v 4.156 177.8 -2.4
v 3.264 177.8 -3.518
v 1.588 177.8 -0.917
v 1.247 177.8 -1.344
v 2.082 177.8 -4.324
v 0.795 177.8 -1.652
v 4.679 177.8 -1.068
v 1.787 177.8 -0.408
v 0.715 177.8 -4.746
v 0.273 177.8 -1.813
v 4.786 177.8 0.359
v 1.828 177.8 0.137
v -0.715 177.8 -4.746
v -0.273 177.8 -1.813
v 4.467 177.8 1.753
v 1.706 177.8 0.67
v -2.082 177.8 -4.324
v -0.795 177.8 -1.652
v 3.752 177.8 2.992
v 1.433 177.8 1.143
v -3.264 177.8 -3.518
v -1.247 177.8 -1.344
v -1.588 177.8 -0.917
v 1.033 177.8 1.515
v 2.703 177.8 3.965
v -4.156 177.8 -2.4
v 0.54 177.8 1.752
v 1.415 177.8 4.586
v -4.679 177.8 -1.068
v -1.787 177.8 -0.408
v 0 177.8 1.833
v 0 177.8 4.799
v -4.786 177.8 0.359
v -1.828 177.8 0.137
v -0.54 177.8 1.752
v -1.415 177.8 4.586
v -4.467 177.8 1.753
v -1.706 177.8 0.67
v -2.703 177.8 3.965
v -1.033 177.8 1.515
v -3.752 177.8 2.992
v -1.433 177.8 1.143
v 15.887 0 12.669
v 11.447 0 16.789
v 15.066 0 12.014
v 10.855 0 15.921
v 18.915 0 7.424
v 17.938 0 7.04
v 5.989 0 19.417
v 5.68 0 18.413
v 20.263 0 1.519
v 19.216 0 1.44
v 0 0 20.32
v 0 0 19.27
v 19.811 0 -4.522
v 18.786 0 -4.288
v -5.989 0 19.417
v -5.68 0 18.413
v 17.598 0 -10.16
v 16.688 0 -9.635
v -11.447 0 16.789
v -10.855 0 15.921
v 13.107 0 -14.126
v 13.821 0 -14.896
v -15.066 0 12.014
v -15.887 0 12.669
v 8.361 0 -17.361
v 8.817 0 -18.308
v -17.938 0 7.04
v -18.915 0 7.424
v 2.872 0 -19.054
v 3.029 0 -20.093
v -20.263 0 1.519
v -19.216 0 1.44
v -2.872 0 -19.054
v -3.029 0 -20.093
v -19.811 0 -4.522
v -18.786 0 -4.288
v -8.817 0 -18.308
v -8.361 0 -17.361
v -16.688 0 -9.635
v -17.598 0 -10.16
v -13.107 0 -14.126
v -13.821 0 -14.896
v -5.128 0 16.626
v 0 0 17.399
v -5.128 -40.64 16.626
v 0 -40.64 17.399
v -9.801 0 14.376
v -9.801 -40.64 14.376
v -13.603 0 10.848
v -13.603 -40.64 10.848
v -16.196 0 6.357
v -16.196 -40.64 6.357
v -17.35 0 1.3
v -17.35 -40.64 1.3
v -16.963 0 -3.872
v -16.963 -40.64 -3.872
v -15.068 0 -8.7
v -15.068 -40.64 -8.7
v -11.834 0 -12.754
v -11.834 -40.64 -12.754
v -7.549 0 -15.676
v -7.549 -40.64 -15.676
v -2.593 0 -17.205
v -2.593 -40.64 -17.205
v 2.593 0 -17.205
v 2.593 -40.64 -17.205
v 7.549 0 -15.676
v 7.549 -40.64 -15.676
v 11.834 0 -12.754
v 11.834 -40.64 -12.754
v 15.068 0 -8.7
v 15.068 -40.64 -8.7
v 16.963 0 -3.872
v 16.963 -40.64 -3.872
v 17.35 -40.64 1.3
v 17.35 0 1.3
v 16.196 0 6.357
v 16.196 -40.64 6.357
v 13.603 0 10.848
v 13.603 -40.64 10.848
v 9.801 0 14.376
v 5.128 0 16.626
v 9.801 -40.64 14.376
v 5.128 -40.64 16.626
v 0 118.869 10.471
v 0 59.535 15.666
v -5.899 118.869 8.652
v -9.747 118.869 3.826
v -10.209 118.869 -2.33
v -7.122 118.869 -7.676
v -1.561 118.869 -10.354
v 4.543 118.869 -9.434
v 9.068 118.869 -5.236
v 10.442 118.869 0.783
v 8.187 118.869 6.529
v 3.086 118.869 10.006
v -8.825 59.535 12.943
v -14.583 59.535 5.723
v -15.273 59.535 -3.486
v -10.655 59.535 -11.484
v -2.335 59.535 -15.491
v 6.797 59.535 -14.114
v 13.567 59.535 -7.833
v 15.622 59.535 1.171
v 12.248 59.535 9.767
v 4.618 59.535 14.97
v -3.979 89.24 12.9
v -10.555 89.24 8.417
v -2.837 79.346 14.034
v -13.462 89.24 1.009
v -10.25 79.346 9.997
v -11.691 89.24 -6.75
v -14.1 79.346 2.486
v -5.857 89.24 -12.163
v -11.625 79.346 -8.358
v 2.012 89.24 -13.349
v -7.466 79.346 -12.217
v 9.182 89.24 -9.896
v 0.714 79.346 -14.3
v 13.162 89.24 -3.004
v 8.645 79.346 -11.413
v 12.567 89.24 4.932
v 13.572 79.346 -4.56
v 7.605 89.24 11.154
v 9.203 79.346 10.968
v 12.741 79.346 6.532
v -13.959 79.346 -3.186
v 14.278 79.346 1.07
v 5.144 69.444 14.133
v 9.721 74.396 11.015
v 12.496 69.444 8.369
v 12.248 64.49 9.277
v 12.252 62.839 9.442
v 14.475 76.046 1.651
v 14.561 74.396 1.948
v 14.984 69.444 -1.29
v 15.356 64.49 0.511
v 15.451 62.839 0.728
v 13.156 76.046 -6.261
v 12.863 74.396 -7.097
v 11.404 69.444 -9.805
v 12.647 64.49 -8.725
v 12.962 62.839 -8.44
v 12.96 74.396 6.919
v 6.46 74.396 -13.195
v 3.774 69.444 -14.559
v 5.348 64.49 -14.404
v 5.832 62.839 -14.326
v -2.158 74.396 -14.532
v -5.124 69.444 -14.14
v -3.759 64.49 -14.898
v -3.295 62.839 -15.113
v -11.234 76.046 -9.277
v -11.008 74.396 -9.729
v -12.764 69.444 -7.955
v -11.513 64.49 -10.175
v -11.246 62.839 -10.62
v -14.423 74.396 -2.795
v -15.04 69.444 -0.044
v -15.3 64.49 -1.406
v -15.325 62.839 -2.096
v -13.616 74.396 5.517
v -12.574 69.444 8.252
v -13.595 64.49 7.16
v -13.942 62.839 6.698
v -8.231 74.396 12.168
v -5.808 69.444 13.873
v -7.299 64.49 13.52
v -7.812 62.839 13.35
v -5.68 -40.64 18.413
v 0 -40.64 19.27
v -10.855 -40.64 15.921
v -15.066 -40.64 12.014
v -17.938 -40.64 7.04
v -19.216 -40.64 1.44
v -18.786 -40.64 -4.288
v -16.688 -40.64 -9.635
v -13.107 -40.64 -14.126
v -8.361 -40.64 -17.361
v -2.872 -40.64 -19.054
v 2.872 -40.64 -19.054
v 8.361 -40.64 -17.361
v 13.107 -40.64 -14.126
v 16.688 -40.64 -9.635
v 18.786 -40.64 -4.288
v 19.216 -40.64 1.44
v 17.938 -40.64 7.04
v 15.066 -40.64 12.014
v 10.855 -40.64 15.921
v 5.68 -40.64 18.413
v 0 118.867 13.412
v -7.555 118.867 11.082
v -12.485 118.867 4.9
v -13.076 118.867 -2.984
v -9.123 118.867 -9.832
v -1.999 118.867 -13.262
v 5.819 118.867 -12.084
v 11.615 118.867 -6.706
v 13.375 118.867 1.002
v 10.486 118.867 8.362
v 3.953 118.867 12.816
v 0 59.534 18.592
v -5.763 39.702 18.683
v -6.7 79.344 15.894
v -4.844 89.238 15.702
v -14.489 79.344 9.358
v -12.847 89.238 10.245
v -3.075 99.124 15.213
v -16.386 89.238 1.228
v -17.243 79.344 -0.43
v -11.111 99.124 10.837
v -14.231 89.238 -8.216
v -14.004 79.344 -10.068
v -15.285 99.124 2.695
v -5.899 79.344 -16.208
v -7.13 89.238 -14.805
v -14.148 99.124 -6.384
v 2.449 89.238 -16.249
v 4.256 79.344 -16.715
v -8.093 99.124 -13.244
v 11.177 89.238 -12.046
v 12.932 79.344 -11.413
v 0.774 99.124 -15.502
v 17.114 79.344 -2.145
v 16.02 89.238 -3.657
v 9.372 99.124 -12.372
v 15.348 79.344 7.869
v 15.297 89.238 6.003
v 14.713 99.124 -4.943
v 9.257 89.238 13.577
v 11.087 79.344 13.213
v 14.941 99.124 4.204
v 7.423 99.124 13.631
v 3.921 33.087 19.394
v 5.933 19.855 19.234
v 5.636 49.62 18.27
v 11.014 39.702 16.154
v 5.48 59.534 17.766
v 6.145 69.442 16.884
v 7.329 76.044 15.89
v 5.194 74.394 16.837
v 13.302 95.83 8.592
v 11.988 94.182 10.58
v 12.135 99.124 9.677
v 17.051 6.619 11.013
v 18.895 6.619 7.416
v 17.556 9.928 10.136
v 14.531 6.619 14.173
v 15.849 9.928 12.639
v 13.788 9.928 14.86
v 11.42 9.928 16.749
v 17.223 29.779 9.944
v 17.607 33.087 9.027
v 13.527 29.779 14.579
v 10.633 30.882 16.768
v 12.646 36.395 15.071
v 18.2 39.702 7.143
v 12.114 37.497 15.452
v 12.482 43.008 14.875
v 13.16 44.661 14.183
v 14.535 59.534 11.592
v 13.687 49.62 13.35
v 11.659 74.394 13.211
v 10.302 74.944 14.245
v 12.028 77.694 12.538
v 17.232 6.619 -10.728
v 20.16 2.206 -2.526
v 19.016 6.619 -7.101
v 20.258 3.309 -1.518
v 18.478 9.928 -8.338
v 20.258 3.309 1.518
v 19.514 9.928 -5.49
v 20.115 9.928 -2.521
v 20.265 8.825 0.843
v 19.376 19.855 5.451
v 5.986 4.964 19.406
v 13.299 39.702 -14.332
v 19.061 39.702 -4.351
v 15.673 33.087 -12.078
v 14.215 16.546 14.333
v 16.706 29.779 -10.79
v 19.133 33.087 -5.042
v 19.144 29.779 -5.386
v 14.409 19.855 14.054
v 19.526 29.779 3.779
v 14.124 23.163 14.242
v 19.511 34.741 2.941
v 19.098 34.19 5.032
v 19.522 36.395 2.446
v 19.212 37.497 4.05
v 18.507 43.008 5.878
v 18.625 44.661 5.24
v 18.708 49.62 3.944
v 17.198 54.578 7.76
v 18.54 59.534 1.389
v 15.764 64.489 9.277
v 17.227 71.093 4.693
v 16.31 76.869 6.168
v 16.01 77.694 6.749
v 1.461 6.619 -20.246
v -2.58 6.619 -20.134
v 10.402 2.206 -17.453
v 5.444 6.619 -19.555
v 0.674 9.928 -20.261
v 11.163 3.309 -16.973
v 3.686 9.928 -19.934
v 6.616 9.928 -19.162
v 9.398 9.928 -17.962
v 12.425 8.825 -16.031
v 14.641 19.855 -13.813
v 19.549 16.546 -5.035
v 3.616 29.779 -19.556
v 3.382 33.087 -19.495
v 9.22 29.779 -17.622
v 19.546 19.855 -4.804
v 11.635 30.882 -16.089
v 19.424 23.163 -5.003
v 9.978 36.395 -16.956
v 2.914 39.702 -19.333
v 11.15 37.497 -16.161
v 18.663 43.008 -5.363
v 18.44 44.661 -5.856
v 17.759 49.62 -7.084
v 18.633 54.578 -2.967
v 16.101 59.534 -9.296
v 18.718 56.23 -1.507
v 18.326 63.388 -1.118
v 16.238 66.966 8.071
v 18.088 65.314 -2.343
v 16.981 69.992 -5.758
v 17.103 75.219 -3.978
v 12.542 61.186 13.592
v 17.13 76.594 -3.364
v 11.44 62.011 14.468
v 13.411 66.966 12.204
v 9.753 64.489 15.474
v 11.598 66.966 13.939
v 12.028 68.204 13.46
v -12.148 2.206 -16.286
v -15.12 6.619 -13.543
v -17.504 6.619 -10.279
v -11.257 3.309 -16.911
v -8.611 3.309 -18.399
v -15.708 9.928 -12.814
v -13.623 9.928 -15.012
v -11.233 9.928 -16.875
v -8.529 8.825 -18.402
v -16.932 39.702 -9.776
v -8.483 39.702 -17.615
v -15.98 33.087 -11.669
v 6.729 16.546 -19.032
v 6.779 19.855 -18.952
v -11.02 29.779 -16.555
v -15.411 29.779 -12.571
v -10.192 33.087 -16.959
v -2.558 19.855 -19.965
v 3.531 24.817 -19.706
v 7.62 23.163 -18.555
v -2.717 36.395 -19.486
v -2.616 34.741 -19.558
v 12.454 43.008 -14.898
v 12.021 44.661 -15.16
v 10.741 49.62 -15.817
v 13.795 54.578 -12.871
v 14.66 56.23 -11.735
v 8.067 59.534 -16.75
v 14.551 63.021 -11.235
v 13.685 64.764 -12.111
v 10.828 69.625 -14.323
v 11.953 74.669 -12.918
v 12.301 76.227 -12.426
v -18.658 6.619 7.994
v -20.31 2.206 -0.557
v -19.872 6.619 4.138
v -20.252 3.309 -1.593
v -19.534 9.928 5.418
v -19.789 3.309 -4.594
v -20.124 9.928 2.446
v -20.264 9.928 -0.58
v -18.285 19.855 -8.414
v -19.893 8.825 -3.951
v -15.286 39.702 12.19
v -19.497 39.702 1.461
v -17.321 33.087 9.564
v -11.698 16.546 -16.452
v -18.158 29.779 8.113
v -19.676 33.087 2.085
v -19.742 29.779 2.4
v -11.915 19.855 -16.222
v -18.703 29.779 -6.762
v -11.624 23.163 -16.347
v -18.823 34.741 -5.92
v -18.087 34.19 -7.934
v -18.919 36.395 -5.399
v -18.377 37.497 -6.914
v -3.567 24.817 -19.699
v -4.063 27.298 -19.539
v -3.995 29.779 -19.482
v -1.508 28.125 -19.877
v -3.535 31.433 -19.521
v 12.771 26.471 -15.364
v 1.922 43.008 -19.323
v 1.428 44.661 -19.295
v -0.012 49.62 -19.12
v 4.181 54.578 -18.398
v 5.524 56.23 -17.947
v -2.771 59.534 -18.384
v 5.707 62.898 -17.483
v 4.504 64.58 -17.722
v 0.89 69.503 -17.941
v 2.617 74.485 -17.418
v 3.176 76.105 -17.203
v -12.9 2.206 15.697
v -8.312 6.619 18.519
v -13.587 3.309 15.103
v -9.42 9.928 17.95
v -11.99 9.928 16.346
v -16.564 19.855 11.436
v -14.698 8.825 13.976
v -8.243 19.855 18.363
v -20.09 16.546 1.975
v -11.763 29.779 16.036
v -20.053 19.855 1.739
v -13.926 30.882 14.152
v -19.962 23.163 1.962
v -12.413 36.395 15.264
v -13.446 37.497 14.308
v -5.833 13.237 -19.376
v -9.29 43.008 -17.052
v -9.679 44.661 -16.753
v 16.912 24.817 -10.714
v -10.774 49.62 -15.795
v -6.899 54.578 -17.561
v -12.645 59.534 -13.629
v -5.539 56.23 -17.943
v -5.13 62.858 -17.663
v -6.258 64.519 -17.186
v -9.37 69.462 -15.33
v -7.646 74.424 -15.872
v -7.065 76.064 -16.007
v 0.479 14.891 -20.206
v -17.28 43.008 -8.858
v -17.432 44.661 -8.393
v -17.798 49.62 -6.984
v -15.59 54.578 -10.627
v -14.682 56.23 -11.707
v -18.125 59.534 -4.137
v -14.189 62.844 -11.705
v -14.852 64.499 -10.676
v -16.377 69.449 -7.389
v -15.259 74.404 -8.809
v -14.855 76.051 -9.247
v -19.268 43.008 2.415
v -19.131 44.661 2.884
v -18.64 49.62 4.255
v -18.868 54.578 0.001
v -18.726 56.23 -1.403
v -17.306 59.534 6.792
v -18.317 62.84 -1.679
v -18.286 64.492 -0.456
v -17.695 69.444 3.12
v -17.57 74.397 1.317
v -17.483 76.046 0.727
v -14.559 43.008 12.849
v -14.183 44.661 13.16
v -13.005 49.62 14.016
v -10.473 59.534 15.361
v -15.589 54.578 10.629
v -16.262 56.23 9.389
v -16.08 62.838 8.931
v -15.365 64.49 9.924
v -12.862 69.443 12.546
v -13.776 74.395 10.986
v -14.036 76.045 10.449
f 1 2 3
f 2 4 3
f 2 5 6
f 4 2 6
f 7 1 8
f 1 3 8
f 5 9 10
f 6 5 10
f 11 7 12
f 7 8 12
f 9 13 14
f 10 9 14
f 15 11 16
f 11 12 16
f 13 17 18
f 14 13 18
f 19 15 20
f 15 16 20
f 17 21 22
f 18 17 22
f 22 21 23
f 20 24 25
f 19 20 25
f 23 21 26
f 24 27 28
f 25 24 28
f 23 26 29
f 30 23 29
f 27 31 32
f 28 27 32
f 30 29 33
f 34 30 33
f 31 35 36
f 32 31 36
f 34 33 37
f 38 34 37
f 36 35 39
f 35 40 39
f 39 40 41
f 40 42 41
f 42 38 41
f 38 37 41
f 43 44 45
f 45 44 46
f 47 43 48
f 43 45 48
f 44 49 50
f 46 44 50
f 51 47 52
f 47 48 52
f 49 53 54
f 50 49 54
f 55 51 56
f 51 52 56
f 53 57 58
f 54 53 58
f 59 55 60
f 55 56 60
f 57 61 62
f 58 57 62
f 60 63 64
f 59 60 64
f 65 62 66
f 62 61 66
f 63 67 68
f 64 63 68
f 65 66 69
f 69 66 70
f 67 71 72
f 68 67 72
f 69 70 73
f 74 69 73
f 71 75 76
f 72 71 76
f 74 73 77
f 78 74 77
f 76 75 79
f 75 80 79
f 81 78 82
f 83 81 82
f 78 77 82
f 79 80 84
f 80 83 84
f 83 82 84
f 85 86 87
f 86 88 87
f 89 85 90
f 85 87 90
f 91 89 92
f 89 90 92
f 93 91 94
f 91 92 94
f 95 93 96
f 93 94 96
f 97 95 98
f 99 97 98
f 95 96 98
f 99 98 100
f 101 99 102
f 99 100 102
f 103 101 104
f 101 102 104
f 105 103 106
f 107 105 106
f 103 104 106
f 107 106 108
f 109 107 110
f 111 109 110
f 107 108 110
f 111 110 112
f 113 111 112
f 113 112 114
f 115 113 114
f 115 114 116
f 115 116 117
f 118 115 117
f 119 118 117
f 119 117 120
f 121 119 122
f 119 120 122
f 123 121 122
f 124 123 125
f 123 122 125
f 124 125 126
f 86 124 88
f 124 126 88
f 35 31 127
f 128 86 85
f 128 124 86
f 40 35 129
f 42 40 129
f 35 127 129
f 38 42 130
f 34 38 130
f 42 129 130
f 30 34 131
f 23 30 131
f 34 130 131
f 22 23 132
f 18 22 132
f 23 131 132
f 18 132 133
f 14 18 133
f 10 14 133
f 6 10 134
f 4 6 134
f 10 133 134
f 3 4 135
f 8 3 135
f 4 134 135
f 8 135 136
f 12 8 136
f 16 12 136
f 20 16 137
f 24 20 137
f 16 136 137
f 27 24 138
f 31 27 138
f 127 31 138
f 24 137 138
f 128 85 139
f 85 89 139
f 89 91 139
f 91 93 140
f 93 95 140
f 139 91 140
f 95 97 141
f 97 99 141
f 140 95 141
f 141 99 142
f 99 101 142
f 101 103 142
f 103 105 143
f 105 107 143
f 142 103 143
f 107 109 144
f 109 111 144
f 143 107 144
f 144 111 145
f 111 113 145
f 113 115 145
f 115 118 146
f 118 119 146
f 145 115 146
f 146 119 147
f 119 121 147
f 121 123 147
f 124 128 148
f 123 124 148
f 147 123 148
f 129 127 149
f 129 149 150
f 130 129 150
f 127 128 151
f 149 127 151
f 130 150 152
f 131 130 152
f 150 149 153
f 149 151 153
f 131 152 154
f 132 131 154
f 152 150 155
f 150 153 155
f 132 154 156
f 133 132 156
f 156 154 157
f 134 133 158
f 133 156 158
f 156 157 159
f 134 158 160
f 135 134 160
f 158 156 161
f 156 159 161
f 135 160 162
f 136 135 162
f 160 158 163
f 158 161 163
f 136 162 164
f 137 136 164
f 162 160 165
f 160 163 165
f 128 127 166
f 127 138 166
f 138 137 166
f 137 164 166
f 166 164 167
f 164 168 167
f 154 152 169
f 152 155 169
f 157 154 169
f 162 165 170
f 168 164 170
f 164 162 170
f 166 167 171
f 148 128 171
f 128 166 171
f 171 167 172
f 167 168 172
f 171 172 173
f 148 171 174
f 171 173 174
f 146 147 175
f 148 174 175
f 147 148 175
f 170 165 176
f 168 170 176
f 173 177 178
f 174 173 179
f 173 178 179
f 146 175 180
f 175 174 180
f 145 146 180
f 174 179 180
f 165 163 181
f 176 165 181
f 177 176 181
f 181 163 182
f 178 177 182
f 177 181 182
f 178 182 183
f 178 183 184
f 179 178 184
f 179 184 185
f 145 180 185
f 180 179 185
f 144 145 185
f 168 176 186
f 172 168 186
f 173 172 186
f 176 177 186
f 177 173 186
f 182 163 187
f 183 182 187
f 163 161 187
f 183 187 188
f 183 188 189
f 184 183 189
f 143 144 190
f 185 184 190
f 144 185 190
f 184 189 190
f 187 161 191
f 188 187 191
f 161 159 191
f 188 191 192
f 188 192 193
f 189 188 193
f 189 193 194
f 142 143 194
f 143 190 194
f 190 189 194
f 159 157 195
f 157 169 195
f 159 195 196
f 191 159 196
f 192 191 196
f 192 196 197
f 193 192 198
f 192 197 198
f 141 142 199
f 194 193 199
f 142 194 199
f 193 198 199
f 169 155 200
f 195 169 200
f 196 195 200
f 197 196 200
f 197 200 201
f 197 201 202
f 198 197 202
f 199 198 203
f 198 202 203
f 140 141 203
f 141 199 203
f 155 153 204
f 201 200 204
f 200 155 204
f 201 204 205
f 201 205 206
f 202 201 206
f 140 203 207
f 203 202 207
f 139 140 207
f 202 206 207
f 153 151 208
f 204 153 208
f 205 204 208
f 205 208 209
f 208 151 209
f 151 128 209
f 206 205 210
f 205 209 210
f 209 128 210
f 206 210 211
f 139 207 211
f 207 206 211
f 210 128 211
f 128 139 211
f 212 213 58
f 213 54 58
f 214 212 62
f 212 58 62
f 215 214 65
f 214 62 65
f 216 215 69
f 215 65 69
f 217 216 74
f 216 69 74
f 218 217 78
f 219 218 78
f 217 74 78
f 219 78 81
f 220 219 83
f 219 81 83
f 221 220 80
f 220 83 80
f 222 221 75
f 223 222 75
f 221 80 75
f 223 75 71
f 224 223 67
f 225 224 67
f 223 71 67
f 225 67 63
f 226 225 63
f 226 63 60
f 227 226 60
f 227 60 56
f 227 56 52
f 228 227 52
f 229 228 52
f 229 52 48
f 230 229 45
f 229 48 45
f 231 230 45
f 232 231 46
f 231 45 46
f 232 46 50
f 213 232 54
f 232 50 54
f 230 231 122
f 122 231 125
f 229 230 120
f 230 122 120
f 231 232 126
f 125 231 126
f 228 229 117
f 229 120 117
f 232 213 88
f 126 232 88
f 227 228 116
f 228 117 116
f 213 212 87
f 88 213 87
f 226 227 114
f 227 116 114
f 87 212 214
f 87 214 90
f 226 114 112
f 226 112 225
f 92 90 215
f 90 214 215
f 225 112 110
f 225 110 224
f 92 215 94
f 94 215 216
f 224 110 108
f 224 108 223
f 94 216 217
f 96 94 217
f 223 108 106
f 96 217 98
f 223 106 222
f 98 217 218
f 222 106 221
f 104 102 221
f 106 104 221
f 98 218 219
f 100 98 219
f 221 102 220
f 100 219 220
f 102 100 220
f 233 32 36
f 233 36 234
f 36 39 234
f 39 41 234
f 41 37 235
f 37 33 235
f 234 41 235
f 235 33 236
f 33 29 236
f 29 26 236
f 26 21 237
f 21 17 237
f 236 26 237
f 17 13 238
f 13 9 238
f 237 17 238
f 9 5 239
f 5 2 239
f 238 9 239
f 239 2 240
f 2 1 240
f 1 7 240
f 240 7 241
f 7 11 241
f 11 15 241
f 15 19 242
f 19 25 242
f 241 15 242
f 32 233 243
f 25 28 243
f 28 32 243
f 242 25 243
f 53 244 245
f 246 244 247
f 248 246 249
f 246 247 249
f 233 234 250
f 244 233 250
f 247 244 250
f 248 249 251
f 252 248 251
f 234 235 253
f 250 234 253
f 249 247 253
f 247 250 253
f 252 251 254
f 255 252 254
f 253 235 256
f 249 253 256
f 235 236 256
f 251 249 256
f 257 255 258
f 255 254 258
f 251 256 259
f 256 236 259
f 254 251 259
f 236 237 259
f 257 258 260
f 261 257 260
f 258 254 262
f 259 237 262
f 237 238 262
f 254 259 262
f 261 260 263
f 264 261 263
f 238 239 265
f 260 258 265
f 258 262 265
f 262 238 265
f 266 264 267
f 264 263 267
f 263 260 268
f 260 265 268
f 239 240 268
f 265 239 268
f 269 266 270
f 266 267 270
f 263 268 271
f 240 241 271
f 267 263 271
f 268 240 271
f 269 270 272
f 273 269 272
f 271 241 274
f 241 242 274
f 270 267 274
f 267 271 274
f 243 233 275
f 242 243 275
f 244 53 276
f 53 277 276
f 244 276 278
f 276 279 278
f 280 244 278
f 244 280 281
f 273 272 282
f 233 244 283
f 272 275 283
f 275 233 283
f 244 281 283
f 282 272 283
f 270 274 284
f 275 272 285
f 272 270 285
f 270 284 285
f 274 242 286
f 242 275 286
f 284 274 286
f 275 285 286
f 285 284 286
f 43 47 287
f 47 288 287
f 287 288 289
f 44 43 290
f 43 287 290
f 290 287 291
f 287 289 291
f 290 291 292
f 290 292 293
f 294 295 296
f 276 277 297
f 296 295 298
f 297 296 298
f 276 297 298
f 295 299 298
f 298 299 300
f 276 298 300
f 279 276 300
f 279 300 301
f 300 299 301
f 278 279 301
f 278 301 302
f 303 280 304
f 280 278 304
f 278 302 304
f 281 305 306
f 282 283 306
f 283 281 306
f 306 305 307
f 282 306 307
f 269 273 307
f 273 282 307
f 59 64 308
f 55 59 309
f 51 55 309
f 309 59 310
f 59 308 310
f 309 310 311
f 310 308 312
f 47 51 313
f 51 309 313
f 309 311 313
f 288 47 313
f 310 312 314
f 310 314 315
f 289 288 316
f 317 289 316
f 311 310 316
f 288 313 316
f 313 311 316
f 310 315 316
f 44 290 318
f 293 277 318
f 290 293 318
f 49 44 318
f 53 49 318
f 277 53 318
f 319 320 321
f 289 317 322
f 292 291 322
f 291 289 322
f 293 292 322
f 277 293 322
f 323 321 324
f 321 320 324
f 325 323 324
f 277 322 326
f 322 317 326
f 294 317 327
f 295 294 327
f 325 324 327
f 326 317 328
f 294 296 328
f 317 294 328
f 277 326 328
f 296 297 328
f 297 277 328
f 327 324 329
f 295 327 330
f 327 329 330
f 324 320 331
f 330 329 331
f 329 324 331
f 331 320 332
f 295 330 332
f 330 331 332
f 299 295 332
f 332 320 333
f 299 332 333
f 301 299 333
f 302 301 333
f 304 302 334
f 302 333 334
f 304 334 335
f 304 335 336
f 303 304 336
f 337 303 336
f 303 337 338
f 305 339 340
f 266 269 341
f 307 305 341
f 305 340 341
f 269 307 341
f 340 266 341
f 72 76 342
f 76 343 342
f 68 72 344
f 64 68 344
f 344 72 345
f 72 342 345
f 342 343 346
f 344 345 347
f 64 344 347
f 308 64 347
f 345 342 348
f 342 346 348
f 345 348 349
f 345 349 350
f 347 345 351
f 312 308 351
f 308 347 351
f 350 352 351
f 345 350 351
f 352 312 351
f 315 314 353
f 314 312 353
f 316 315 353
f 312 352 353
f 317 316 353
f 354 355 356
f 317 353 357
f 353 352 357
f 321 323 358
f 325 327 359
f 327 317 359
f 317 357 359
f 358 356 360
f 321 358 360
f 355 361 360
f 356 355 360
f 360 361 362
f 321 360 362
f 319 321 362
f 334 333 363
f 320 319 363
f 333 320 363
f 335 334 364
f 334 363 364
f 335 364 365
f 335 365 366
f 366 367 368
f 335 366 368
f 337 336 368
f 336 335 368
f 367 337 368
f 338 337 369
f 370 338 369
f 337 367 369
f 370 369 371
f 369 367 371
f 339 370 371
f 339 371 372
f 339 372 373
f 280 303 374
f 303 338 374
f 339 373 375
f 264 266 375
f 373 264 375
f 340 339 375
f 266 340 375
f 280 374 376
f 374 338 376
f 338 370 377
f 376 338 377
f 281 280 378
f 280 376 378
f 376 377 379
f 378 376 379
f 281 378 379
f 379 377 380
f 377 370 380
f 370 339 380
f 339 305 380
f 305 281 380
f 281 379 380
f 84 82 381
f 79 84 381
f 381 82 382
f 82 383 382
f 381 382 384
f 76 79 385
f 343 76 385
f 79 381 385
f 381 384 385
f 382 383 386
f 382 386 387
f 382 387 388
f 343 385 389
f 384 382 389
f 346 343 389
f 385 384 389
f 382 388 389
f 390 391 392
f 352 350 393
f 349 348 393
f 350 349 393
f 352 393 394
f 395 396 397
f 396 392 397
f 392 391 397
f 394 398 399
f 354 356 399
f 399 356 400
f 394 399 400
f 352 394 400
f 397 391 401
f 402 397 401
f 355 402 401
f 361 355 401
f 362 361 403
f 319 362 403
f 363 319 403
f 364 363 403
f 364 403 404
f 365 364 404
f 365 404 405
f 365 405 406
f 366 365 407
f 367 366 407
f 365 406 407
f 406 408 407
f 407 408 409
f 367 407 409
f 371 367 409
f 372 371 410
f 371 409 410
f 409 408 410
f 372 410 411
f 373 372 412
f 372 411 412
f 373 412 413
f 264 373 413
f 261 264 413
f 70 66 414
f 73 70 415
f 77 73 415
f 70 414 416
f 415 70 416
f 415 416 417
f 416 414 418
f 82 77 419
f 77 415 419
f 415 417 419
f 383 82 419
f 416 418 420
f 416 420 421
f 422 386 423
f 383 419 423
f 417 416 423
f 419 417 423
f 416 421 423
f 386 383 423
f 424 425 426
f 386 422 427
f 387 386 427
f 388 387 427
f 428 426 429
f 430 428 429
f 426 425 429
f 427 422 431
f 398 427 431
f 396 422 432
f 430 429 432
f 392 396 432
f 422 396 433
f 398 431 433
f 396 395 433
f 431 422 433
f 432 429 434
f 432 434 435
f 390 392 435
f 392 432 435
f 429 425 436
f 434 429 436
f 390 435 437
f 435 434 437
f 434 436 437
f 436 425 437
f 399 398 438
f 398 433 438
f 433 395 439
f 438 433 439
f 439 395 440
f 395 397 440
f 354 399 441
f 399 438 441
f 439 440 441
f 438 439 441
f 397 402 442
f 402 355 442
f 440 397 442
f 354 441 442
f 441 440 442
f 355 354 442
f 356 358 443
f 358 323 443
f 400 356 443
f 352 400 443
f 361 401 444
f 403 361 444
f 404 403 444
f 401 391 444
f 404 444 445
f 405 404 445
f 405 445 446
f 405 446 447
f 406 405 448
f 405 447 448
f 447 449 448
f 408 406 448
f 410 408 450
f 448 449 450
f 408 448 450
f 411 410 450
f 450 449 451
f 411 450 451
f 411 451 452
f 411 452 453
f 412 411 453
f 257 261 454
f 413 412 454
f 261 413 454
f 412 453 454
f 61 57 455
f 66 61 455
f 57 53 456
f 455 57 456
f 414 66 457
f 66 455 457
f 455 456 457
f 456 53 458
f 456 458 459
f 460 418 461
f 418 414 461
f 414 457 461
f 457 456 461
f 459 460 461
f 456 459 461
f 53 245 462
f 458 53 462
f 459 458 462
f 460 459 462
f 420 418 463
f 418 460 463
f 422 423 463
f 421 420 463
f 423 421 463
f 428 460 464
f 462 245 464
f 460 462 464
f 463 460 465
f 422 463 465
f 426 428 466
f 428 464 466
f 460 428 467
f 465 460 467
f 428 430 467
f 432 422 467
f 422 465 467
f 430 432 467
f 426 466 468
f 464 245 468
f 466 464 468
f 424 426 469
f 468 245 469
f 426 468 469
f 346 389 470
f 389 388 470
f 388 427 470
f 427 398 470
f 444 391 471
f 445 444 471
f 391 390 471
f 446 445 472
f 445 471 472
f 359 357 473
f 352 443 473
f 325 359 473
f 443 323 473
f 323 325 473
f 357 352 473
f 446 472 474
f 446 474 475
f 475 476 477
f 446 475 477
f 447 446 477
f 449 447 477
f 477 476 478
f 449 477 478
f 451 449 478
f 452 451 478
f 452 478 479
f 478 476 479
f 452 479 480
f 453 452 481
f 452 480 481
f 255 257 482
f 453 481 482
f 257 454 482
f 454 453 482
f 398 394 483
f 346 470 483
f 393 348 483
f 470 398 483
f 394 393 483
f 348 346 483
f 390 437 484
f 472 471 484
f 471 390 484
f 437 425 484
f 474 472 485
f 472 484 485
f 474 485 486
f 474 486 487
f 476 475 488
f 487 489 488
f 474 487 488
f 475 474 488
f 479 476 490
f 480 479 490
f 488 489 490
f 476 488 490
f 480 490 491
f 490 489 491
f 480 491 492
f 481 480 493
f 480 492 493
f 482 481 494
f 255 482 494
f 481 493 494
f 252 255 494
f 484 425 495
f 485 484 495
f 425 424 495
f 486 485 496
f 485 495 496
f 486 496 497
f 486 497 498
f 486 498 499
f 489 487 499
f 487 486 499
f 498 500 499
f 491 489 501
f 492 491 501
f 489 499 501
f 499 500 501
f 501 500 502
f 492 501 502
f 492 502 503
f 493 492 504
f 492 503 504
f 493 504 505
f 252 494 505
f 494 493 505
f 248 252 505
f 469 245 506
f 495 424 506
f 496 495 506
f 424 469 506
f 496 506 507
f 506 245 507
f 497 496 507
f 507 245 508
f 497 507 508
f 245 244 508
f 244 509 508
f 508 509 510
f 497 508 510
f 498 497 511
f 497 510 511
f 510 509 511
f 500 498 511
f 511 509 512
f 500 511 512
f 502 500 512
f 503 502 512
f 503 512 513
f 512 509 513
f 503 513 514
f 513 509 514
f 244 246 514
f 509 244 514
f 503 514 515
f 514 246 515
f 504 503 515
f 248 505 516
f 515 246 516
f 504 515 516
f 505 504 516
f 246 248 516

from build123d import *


with BuildPart() as part:
    # Sketch1 → Revolve3 (revolve)
    with BuildSketch(Plane.XY, mode=Mode.PRIVATE) as revolve3_sk:
        with BuildLine():
            Line((-17.399, 0), (-17.399, -40.64))
            Line((-17.399, -40.64), (-19.269565144, -40.64))
            Line((-19.269565144, -40.64), (-19.269565144, 0))
            Line((-19.269565144, 0), (-20.32, 0))
            ThreePointArc((-20.32, 0), (-16.432425265, 89.23807563), (-4.799156969, 177.8))
            Line((-4.799156969, 177.8), (-1.833166816, 177.8))
            ThreePointArc((-1.833166816, 177.8), (-13.500113667, 89.240034686), (-17.399, 0))
        make_face()
    revolve(revolve3_sk.sketch.rotate(Axis((0, 203.2, 0), (0, -1, 0)), 270), axis=Axis((0, 203.2, 0), (0, -1, 0)))


solid = part.part
